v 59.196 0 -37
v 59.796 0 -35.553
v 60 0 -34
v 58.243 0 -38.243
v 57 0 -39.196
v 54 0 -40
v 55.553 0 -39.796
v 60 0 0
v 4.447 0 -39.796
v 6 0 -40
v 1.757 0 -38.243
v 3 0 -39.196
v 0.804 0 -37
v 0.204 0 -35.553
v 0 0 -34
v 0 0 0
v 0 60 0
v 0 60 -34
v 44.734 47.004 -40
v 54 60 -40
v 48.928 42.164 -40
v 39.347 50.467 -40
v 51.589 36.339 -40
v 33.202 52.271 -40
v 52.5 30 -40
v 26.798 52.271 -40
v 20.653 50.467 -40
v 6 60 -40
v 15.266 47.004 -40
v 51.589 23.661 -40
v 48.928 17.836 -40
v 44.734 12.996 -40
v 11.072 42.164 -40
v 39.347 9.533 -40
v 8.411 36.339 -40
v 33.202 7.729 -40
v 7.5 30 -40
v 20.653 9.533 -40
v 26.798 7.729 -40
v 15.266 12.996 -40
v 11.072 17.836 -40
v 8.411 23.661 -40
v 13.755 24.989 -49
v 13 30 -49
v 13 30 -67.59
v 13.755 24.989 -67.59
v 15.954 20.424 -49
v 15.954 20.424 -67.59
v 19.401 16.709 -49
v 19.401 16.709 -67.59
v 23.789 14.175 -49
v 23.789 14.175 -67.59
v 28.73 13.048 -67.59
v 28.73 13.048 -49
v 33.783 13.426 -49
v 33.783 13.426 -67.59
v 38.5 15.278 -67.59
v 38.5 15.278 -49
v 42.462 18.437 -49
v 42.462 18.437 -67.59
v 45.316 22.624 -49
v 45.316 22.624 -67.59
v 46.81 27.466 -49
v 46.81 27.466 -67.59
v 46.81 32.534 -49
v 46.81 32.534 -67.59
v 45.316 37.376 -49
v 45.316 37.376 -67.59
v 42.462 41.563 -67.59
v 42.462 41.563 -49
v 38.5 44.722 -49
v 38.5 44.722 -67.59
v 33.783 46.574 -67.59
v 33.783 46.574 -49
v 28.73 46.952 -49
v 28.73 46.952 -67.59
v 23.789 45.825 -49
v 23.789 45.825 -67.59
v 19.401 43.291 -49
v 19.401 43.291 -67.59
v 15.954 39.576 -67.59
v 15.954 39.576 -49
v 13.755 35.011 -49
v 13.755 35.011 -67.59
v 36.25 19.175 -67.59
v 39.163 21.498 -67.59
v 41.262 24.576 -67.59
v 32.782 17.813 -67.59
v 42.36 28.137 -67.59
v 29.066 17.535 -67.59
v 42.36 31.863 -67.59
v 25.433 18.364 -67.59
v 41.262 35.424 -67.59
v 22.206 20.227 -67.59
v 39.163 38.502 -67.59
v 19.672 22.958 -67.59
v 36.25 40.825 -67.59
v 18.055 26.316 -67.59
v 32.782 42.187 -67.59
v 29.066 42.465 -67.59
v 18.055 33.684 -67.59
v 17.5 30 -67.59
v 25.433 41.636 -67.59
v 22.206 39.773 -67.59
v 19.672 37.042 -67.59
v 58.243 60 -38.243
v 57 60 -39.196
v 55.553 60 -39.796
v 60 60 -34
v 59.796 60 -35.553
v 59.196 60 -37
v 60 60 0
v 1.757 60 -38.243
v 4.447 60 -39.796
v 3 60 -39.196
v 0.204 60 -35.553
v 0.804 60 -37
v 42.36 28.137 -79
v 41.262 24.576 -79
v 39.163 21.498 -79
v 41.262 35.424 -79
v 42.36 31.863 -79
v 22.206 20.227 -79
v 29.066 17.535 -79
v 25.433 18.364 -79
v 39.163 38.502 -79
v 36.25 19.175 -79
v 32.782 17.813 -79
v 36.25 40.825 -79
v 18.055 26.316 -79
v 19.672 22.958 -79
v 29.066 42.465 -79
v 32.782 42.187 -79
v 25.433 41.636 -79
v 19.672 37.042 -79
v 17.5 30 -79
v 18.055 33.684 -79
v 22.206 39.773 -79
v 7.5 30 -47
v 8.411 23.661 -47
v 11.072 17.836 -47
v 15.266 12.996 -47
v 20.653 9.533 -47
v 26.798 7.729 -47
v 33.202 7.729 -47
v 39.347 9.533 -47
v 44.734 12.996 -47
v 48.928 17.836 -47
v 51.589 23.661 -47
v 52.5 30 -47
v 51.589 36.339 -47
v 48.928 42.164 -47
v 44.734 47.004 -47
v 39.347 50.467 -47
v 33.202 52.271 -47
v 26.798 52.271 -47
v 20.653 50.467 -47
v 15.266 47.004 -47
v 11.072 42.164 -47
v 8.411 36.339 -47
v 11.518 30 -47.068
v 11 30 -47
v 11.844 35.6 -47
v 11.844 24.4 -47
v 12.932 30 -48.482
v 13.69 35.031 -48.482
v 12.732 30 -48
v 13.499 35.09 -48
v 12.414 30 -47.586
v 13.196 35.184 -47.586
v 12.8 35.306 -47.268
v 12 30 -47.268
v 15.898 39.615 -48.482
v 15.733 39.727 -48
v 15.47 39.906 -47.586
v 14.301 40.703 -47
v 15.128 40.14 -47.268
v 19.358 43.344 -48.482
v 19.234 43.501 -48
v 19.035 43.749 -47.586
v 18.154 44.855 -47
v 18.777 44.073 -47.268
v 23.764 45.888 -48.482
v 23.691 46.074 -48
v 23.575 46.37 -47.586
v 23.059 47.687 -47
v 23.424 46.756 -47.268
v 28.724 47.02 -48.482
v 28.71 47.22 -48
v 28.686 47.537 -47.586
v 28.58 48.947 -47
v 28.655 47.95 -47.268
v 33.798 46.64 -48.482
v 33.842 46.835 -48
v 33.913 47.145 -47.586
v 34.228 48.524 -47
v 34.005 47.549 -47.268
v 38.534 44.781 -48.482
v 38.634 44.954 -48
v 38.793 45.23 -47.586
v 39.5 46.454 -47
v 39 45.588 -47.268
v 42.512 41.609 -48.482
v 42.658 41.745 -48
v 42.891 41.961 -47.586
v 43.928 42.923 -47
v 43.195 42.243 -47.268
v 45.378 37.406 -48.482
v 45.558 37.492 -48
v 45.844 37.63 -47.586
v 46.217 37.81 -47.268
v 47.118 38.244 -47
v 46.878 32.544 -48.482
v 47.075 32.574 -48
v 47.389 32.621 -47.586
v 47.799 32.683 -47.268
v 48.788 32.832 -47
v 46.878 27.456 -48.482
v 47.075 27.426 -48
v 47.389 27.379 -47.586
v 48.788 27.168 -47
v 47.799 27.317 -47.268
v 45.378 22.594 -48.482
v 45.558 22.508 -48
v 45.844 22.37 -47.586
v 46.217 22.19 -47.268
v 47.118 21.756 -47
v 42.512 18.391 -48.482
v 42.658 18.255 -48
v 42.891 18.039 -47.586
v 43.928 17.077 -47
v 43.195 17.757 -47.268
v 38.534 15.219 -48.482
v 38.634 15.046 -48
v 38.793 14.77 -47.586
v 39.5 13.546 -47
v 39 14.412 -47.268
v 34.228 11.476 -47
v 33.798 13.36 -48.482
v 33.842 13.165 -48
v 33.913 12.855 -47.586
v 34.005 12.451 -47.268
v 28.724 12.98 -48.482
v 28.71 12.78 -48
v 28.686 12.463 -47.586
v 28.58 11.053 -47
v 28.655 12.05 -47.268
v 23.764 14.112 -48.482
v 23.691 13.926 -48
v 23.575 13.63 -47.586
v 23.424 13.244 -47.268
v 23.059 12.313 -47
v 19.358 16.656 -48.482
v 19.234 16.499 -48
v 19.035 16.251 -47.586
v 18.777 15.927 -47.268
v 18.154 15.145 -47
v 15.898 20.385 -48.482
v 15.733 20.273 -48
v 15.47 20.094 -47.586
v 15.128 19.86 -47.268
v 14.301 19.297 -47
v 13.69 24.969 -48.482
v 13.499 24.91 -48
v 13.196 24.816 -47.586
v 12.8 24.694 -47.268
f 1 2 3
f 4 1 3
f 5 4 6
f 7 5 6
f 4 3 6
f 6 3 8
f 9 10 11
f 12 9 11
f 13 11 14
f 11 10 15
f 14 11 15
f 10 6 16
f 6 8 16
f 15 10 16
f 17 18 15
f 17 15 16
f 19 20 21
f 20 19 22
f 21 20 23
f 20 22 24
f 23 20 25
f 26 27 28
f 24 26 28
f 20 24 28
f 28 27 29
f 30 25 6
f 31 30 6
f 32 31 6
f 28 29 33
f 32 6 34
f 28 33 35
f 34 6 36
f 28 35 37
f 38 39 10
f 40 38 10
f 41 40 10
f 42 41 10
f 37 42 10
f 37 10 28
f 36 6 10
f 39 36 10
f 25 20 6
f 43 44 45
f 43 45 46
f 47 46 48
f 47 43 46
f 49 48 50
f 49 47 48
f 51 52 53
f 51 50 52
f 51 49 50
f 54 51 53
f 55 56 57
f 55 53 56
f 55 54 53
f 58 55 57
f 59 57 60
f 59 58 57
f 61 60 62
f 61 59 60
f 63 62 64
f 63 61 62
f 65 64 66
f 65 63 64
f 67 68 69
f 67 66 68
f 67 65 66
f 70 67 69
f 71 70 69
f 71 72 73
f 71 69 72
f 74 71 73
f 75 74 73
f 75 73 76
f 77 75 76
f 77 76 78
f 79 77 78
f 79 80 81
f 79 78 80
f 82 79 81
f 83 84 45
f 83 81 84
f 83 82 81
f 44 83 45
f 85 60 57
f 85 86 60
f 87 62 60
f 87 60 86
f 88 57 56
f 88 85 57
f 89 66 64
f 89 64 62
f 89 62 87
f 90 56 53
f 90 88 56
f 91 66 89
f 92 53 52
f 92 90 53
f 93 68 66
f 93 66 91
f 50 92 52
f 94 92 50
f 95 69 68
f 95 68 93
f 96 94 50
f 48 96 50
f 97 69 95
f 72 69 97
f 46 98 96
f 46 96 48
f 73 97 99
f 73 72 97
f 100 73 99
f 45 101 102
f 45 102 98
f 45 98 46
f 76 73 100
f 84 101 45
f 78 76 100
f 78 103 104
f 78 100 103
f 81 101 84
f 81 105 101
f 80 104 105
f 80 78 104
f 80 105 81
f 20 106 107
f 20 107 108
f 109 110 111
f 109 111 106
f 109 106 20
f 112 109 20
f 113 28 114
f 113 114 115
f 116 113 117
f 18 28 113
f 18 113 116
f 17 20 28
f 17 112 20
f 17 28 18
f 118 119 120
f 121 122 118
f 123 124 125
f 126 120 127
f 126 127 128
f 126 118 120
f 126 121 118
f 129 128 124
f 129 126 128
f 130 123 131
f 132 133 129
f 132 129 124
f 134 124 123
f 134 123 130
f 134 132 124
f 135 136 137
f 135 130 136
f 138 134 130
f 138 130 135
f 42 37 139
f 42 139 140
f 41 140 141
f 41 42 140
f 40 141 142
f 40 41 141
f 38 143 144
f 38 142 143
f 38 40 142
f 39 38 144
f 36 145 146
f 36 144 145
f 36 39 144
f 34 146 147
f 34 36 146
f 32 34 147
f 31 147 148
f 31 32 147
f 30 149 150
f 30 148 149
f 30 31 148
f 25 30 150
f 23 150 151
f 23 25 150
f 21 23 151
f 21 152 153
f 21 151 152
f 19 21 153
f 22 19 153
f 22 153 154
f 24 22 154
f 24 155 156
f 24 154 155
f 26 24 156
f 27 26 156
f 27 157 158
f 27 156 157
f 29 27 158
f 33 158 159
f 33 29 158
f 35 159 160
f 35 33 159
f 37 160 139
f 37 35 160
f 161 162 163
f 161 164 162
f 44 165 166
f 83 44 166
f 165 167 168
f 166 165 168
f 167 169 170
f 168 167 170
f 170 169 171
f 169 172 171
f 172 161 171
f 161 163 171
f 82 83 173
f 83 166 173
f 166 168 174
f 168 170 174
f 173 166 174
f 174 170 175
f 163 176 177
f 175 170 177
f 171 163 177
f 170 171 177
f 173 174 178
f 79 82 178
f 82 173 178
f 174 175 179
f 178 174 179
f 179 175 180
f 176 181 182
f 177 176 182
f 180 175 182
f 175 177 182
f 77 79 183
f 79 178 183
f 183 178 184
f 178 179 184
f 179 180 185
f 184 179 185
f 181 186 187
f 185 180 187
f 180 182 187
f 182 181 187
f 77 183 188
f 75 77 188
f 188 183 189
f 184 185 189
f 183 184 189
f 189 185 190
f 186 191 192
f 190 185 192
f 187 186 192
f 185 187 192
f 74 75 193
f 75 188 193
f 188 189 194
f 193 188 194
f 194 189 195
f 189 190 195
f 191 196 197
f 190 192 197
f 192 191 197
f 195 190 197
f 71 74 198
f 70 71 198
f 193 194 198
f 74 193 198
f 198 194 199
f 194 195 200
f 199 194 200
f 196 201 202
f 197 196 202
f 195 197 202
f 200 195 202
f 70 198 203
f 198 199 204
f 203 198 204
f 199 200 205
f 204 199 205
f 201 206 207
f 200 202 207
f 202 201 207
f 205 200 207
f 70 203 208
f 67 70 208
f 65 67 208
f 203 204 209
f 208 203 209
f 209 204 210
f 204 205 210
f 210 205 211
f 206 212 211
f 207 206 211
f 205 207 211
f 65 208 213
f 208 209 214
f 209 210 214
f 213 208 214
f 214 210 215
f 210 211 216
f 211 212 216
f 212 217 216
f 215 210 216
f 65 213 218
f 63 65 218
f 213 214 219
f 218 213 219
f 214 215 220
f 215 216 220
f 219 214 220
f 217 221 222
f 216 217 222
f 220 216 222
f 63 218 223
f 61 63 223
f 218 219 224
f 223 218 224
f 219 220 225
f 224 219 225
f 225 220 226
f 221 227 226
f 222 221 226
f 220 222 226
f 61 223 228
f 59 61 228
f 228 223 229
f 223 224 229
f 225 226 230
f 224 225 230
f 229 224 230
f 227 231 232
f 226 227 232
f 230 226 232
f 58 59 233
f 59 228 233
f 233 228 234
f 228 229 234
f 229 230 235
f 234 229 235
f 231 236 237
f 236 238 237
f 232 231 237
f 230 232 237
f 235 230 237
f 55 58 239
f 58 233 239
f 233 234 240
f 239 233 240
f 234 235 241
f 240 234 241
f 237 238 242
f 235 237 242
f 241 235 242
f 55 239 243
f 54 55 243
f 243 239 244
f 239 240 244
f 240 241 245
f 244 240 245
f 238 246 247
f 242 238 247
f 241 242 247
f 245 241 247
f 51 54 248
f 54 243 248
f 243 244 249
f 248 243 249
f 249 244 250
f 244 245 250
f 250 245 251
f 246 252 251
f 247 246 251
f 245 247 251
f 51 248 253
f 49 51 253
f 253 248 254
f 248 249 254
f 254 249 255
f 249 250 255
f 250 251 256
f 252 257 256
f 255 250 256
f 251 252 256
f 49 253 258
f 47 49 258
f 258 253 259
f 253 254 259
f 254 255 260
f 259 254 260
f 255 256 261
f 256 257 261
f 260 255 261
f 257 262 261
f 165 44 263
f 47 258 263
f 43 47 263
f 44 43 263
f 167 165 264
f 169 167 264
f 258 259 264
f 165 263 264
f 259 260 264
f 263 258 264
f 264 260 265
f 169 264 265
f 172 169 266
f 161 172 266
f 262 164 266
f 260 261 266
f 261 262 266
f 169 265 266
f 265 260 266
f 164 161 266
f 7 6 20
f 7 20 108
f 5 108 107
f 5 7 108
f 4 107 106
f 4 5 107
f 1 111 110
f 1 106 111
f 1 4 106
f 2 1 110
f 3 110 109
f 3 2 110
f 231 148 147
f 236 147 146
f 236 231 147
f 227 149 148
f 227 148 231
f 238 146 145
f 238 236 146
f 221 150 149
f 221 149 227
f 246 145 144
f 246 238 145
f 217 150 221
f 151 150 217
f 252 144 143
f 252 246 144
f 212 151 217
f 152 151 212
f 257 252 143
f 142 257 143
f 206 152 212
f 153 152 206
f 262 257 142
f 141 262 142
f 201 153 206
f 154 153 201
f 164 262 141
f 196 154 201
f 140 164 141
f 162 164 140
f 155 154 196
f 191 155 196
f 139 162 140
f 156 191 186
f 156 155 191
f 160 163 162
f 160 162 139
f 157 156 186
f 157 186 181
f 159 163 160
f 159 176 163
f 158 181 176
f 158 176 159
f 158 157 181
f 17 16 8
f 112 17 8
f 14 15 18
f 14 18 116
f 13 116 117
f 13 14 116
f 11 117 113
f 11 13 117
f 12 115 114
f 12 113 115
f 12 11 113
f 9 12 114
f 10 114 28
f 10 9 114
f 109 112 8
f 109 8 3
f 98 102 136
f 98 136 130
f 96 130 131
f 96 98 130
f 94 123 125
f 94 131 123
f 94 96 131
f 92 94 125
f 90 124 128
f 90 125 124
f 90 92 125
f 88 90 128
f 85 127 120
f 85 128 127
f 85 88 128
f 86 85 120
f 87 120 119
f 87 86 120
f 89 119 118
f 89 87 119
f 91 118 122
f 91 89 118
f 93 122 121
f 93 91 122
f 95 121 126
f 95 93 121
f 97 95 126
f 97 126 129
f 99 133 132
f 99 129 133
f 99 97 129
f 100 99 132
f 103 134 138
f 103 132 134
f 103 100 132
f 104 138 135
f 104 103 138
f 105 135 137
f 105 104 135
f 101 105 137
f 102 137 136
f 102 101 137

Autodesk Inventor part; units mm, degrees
ref_plane "YZ Plane" through (0, 0, 0) normal (1, 0, 0) x (0, 1, 0)
ref_plane "XZ Plane" through (0, 0, 0) normal (0, 1, 0) x (-1, 0, 0)
ref_plane "XY Plane" through (0, 0, 0) normal (0, 0, 1) x (1, 0, 0)
sketch "Boceto1" plane through (0, 0, 0) normal (0, 1, 0) x (-1, 0, 0)
  line L0 (0, 0) -> (-60, 0)
  line L1 (-60, 0) -> (-60, -34)
  line L2 (-54, -40) -> (-6, -40)
  line L3 (0, -34) -> (0, 0)
  arc A0 (-6, -40) -> (0, -34) centre (-6, -34) ccw
  arc A1 (-60, -34) -> (-54, -40) centre (-54, -34) ccw
  point P0 (-60, -40)
  dimension "d0" = 60
  dimension "d1" = 40
  dimension "d2" = 6
  dimension "d3" = 6
extrude "Extrusión1" add sketch "Boceto1" along normal blind 60
sketch "Boceto2" plane through (54, 0, -40) normal (0, 0, -1) x (-1, 0, 0)
  line L0 (0, 0) -> (48, 0) projected
  line L1 (48, 0) -> (48, 60) projected
  line L2 (0, 60) -> (48, 60) projected
  line L3 (0, 0) -> (0, 60) projected
  circle A0 centre (24, 30) radius 22.5
  circle A1 centre (24, 30) radius 17
  circle A2 centre (24, 30) radius 15
  circle A3 centre (24, 30) radius 12.5
  point P0 (54, 0)
  dimension "d6" = 45
  dimension "d7" = 34
  dimension "d8" = 30
  dimension "d9" = 25
extrude "Extrusión3" add sketch "Boceto2" along normal blind 7 contours A0
sketch "Boceto5" plane through (30, 30, -40) normal (0, 0, -1) x (-1, 0, 0)
  circle A0 centre (0, 0) radius 17
  point P0 (30, -30)
  dimension "d14" = 34
extrude "Extrusión4" add sketch "Boceto5" along normal blind 27.59
fillet "Empalme1" radius 2 1 edges at (47, 30, -47)
sketch "Boceto8" plane through (30, 30, -67.59) normal (0, 0, -1) x (-1, 0, 0)
  circle A0 centre (0, 0) radius 12.5
  point P0 (30, -30)
  dimension "d23" = 25
extrude "Extrusión6" add sketch "Boceto8" along normal blind 11.41
sketch "Boceto9" plane through (30, 30, -79) normal (0, 0, -1) x (-1, 0, 0)
  point P0 (30, -30)
equation "\"Radio_pliegue\" = Grosor"
equation "\"Anchura_desahogo_plegado\" = Grosor"
equation "\"Profundidad_desahogo_plegado\" = 0.5 * Grosor"
equation "\"Tamaño_destalonado\" = 4 * Grosor"
equation "\"Remanente_mínimo\" = 2 * Grosor"
equation "\"Radiodetransición\" = Radio_pliegue"
equation "\"Tamaño_de_radio_de_Jacobi\" = Radio_pliegue"
equation "\"TamañoSeparación\" = Grosor"
equation "\"Grosor\" = 0.5"
properties part number "Practica 12 nt"
